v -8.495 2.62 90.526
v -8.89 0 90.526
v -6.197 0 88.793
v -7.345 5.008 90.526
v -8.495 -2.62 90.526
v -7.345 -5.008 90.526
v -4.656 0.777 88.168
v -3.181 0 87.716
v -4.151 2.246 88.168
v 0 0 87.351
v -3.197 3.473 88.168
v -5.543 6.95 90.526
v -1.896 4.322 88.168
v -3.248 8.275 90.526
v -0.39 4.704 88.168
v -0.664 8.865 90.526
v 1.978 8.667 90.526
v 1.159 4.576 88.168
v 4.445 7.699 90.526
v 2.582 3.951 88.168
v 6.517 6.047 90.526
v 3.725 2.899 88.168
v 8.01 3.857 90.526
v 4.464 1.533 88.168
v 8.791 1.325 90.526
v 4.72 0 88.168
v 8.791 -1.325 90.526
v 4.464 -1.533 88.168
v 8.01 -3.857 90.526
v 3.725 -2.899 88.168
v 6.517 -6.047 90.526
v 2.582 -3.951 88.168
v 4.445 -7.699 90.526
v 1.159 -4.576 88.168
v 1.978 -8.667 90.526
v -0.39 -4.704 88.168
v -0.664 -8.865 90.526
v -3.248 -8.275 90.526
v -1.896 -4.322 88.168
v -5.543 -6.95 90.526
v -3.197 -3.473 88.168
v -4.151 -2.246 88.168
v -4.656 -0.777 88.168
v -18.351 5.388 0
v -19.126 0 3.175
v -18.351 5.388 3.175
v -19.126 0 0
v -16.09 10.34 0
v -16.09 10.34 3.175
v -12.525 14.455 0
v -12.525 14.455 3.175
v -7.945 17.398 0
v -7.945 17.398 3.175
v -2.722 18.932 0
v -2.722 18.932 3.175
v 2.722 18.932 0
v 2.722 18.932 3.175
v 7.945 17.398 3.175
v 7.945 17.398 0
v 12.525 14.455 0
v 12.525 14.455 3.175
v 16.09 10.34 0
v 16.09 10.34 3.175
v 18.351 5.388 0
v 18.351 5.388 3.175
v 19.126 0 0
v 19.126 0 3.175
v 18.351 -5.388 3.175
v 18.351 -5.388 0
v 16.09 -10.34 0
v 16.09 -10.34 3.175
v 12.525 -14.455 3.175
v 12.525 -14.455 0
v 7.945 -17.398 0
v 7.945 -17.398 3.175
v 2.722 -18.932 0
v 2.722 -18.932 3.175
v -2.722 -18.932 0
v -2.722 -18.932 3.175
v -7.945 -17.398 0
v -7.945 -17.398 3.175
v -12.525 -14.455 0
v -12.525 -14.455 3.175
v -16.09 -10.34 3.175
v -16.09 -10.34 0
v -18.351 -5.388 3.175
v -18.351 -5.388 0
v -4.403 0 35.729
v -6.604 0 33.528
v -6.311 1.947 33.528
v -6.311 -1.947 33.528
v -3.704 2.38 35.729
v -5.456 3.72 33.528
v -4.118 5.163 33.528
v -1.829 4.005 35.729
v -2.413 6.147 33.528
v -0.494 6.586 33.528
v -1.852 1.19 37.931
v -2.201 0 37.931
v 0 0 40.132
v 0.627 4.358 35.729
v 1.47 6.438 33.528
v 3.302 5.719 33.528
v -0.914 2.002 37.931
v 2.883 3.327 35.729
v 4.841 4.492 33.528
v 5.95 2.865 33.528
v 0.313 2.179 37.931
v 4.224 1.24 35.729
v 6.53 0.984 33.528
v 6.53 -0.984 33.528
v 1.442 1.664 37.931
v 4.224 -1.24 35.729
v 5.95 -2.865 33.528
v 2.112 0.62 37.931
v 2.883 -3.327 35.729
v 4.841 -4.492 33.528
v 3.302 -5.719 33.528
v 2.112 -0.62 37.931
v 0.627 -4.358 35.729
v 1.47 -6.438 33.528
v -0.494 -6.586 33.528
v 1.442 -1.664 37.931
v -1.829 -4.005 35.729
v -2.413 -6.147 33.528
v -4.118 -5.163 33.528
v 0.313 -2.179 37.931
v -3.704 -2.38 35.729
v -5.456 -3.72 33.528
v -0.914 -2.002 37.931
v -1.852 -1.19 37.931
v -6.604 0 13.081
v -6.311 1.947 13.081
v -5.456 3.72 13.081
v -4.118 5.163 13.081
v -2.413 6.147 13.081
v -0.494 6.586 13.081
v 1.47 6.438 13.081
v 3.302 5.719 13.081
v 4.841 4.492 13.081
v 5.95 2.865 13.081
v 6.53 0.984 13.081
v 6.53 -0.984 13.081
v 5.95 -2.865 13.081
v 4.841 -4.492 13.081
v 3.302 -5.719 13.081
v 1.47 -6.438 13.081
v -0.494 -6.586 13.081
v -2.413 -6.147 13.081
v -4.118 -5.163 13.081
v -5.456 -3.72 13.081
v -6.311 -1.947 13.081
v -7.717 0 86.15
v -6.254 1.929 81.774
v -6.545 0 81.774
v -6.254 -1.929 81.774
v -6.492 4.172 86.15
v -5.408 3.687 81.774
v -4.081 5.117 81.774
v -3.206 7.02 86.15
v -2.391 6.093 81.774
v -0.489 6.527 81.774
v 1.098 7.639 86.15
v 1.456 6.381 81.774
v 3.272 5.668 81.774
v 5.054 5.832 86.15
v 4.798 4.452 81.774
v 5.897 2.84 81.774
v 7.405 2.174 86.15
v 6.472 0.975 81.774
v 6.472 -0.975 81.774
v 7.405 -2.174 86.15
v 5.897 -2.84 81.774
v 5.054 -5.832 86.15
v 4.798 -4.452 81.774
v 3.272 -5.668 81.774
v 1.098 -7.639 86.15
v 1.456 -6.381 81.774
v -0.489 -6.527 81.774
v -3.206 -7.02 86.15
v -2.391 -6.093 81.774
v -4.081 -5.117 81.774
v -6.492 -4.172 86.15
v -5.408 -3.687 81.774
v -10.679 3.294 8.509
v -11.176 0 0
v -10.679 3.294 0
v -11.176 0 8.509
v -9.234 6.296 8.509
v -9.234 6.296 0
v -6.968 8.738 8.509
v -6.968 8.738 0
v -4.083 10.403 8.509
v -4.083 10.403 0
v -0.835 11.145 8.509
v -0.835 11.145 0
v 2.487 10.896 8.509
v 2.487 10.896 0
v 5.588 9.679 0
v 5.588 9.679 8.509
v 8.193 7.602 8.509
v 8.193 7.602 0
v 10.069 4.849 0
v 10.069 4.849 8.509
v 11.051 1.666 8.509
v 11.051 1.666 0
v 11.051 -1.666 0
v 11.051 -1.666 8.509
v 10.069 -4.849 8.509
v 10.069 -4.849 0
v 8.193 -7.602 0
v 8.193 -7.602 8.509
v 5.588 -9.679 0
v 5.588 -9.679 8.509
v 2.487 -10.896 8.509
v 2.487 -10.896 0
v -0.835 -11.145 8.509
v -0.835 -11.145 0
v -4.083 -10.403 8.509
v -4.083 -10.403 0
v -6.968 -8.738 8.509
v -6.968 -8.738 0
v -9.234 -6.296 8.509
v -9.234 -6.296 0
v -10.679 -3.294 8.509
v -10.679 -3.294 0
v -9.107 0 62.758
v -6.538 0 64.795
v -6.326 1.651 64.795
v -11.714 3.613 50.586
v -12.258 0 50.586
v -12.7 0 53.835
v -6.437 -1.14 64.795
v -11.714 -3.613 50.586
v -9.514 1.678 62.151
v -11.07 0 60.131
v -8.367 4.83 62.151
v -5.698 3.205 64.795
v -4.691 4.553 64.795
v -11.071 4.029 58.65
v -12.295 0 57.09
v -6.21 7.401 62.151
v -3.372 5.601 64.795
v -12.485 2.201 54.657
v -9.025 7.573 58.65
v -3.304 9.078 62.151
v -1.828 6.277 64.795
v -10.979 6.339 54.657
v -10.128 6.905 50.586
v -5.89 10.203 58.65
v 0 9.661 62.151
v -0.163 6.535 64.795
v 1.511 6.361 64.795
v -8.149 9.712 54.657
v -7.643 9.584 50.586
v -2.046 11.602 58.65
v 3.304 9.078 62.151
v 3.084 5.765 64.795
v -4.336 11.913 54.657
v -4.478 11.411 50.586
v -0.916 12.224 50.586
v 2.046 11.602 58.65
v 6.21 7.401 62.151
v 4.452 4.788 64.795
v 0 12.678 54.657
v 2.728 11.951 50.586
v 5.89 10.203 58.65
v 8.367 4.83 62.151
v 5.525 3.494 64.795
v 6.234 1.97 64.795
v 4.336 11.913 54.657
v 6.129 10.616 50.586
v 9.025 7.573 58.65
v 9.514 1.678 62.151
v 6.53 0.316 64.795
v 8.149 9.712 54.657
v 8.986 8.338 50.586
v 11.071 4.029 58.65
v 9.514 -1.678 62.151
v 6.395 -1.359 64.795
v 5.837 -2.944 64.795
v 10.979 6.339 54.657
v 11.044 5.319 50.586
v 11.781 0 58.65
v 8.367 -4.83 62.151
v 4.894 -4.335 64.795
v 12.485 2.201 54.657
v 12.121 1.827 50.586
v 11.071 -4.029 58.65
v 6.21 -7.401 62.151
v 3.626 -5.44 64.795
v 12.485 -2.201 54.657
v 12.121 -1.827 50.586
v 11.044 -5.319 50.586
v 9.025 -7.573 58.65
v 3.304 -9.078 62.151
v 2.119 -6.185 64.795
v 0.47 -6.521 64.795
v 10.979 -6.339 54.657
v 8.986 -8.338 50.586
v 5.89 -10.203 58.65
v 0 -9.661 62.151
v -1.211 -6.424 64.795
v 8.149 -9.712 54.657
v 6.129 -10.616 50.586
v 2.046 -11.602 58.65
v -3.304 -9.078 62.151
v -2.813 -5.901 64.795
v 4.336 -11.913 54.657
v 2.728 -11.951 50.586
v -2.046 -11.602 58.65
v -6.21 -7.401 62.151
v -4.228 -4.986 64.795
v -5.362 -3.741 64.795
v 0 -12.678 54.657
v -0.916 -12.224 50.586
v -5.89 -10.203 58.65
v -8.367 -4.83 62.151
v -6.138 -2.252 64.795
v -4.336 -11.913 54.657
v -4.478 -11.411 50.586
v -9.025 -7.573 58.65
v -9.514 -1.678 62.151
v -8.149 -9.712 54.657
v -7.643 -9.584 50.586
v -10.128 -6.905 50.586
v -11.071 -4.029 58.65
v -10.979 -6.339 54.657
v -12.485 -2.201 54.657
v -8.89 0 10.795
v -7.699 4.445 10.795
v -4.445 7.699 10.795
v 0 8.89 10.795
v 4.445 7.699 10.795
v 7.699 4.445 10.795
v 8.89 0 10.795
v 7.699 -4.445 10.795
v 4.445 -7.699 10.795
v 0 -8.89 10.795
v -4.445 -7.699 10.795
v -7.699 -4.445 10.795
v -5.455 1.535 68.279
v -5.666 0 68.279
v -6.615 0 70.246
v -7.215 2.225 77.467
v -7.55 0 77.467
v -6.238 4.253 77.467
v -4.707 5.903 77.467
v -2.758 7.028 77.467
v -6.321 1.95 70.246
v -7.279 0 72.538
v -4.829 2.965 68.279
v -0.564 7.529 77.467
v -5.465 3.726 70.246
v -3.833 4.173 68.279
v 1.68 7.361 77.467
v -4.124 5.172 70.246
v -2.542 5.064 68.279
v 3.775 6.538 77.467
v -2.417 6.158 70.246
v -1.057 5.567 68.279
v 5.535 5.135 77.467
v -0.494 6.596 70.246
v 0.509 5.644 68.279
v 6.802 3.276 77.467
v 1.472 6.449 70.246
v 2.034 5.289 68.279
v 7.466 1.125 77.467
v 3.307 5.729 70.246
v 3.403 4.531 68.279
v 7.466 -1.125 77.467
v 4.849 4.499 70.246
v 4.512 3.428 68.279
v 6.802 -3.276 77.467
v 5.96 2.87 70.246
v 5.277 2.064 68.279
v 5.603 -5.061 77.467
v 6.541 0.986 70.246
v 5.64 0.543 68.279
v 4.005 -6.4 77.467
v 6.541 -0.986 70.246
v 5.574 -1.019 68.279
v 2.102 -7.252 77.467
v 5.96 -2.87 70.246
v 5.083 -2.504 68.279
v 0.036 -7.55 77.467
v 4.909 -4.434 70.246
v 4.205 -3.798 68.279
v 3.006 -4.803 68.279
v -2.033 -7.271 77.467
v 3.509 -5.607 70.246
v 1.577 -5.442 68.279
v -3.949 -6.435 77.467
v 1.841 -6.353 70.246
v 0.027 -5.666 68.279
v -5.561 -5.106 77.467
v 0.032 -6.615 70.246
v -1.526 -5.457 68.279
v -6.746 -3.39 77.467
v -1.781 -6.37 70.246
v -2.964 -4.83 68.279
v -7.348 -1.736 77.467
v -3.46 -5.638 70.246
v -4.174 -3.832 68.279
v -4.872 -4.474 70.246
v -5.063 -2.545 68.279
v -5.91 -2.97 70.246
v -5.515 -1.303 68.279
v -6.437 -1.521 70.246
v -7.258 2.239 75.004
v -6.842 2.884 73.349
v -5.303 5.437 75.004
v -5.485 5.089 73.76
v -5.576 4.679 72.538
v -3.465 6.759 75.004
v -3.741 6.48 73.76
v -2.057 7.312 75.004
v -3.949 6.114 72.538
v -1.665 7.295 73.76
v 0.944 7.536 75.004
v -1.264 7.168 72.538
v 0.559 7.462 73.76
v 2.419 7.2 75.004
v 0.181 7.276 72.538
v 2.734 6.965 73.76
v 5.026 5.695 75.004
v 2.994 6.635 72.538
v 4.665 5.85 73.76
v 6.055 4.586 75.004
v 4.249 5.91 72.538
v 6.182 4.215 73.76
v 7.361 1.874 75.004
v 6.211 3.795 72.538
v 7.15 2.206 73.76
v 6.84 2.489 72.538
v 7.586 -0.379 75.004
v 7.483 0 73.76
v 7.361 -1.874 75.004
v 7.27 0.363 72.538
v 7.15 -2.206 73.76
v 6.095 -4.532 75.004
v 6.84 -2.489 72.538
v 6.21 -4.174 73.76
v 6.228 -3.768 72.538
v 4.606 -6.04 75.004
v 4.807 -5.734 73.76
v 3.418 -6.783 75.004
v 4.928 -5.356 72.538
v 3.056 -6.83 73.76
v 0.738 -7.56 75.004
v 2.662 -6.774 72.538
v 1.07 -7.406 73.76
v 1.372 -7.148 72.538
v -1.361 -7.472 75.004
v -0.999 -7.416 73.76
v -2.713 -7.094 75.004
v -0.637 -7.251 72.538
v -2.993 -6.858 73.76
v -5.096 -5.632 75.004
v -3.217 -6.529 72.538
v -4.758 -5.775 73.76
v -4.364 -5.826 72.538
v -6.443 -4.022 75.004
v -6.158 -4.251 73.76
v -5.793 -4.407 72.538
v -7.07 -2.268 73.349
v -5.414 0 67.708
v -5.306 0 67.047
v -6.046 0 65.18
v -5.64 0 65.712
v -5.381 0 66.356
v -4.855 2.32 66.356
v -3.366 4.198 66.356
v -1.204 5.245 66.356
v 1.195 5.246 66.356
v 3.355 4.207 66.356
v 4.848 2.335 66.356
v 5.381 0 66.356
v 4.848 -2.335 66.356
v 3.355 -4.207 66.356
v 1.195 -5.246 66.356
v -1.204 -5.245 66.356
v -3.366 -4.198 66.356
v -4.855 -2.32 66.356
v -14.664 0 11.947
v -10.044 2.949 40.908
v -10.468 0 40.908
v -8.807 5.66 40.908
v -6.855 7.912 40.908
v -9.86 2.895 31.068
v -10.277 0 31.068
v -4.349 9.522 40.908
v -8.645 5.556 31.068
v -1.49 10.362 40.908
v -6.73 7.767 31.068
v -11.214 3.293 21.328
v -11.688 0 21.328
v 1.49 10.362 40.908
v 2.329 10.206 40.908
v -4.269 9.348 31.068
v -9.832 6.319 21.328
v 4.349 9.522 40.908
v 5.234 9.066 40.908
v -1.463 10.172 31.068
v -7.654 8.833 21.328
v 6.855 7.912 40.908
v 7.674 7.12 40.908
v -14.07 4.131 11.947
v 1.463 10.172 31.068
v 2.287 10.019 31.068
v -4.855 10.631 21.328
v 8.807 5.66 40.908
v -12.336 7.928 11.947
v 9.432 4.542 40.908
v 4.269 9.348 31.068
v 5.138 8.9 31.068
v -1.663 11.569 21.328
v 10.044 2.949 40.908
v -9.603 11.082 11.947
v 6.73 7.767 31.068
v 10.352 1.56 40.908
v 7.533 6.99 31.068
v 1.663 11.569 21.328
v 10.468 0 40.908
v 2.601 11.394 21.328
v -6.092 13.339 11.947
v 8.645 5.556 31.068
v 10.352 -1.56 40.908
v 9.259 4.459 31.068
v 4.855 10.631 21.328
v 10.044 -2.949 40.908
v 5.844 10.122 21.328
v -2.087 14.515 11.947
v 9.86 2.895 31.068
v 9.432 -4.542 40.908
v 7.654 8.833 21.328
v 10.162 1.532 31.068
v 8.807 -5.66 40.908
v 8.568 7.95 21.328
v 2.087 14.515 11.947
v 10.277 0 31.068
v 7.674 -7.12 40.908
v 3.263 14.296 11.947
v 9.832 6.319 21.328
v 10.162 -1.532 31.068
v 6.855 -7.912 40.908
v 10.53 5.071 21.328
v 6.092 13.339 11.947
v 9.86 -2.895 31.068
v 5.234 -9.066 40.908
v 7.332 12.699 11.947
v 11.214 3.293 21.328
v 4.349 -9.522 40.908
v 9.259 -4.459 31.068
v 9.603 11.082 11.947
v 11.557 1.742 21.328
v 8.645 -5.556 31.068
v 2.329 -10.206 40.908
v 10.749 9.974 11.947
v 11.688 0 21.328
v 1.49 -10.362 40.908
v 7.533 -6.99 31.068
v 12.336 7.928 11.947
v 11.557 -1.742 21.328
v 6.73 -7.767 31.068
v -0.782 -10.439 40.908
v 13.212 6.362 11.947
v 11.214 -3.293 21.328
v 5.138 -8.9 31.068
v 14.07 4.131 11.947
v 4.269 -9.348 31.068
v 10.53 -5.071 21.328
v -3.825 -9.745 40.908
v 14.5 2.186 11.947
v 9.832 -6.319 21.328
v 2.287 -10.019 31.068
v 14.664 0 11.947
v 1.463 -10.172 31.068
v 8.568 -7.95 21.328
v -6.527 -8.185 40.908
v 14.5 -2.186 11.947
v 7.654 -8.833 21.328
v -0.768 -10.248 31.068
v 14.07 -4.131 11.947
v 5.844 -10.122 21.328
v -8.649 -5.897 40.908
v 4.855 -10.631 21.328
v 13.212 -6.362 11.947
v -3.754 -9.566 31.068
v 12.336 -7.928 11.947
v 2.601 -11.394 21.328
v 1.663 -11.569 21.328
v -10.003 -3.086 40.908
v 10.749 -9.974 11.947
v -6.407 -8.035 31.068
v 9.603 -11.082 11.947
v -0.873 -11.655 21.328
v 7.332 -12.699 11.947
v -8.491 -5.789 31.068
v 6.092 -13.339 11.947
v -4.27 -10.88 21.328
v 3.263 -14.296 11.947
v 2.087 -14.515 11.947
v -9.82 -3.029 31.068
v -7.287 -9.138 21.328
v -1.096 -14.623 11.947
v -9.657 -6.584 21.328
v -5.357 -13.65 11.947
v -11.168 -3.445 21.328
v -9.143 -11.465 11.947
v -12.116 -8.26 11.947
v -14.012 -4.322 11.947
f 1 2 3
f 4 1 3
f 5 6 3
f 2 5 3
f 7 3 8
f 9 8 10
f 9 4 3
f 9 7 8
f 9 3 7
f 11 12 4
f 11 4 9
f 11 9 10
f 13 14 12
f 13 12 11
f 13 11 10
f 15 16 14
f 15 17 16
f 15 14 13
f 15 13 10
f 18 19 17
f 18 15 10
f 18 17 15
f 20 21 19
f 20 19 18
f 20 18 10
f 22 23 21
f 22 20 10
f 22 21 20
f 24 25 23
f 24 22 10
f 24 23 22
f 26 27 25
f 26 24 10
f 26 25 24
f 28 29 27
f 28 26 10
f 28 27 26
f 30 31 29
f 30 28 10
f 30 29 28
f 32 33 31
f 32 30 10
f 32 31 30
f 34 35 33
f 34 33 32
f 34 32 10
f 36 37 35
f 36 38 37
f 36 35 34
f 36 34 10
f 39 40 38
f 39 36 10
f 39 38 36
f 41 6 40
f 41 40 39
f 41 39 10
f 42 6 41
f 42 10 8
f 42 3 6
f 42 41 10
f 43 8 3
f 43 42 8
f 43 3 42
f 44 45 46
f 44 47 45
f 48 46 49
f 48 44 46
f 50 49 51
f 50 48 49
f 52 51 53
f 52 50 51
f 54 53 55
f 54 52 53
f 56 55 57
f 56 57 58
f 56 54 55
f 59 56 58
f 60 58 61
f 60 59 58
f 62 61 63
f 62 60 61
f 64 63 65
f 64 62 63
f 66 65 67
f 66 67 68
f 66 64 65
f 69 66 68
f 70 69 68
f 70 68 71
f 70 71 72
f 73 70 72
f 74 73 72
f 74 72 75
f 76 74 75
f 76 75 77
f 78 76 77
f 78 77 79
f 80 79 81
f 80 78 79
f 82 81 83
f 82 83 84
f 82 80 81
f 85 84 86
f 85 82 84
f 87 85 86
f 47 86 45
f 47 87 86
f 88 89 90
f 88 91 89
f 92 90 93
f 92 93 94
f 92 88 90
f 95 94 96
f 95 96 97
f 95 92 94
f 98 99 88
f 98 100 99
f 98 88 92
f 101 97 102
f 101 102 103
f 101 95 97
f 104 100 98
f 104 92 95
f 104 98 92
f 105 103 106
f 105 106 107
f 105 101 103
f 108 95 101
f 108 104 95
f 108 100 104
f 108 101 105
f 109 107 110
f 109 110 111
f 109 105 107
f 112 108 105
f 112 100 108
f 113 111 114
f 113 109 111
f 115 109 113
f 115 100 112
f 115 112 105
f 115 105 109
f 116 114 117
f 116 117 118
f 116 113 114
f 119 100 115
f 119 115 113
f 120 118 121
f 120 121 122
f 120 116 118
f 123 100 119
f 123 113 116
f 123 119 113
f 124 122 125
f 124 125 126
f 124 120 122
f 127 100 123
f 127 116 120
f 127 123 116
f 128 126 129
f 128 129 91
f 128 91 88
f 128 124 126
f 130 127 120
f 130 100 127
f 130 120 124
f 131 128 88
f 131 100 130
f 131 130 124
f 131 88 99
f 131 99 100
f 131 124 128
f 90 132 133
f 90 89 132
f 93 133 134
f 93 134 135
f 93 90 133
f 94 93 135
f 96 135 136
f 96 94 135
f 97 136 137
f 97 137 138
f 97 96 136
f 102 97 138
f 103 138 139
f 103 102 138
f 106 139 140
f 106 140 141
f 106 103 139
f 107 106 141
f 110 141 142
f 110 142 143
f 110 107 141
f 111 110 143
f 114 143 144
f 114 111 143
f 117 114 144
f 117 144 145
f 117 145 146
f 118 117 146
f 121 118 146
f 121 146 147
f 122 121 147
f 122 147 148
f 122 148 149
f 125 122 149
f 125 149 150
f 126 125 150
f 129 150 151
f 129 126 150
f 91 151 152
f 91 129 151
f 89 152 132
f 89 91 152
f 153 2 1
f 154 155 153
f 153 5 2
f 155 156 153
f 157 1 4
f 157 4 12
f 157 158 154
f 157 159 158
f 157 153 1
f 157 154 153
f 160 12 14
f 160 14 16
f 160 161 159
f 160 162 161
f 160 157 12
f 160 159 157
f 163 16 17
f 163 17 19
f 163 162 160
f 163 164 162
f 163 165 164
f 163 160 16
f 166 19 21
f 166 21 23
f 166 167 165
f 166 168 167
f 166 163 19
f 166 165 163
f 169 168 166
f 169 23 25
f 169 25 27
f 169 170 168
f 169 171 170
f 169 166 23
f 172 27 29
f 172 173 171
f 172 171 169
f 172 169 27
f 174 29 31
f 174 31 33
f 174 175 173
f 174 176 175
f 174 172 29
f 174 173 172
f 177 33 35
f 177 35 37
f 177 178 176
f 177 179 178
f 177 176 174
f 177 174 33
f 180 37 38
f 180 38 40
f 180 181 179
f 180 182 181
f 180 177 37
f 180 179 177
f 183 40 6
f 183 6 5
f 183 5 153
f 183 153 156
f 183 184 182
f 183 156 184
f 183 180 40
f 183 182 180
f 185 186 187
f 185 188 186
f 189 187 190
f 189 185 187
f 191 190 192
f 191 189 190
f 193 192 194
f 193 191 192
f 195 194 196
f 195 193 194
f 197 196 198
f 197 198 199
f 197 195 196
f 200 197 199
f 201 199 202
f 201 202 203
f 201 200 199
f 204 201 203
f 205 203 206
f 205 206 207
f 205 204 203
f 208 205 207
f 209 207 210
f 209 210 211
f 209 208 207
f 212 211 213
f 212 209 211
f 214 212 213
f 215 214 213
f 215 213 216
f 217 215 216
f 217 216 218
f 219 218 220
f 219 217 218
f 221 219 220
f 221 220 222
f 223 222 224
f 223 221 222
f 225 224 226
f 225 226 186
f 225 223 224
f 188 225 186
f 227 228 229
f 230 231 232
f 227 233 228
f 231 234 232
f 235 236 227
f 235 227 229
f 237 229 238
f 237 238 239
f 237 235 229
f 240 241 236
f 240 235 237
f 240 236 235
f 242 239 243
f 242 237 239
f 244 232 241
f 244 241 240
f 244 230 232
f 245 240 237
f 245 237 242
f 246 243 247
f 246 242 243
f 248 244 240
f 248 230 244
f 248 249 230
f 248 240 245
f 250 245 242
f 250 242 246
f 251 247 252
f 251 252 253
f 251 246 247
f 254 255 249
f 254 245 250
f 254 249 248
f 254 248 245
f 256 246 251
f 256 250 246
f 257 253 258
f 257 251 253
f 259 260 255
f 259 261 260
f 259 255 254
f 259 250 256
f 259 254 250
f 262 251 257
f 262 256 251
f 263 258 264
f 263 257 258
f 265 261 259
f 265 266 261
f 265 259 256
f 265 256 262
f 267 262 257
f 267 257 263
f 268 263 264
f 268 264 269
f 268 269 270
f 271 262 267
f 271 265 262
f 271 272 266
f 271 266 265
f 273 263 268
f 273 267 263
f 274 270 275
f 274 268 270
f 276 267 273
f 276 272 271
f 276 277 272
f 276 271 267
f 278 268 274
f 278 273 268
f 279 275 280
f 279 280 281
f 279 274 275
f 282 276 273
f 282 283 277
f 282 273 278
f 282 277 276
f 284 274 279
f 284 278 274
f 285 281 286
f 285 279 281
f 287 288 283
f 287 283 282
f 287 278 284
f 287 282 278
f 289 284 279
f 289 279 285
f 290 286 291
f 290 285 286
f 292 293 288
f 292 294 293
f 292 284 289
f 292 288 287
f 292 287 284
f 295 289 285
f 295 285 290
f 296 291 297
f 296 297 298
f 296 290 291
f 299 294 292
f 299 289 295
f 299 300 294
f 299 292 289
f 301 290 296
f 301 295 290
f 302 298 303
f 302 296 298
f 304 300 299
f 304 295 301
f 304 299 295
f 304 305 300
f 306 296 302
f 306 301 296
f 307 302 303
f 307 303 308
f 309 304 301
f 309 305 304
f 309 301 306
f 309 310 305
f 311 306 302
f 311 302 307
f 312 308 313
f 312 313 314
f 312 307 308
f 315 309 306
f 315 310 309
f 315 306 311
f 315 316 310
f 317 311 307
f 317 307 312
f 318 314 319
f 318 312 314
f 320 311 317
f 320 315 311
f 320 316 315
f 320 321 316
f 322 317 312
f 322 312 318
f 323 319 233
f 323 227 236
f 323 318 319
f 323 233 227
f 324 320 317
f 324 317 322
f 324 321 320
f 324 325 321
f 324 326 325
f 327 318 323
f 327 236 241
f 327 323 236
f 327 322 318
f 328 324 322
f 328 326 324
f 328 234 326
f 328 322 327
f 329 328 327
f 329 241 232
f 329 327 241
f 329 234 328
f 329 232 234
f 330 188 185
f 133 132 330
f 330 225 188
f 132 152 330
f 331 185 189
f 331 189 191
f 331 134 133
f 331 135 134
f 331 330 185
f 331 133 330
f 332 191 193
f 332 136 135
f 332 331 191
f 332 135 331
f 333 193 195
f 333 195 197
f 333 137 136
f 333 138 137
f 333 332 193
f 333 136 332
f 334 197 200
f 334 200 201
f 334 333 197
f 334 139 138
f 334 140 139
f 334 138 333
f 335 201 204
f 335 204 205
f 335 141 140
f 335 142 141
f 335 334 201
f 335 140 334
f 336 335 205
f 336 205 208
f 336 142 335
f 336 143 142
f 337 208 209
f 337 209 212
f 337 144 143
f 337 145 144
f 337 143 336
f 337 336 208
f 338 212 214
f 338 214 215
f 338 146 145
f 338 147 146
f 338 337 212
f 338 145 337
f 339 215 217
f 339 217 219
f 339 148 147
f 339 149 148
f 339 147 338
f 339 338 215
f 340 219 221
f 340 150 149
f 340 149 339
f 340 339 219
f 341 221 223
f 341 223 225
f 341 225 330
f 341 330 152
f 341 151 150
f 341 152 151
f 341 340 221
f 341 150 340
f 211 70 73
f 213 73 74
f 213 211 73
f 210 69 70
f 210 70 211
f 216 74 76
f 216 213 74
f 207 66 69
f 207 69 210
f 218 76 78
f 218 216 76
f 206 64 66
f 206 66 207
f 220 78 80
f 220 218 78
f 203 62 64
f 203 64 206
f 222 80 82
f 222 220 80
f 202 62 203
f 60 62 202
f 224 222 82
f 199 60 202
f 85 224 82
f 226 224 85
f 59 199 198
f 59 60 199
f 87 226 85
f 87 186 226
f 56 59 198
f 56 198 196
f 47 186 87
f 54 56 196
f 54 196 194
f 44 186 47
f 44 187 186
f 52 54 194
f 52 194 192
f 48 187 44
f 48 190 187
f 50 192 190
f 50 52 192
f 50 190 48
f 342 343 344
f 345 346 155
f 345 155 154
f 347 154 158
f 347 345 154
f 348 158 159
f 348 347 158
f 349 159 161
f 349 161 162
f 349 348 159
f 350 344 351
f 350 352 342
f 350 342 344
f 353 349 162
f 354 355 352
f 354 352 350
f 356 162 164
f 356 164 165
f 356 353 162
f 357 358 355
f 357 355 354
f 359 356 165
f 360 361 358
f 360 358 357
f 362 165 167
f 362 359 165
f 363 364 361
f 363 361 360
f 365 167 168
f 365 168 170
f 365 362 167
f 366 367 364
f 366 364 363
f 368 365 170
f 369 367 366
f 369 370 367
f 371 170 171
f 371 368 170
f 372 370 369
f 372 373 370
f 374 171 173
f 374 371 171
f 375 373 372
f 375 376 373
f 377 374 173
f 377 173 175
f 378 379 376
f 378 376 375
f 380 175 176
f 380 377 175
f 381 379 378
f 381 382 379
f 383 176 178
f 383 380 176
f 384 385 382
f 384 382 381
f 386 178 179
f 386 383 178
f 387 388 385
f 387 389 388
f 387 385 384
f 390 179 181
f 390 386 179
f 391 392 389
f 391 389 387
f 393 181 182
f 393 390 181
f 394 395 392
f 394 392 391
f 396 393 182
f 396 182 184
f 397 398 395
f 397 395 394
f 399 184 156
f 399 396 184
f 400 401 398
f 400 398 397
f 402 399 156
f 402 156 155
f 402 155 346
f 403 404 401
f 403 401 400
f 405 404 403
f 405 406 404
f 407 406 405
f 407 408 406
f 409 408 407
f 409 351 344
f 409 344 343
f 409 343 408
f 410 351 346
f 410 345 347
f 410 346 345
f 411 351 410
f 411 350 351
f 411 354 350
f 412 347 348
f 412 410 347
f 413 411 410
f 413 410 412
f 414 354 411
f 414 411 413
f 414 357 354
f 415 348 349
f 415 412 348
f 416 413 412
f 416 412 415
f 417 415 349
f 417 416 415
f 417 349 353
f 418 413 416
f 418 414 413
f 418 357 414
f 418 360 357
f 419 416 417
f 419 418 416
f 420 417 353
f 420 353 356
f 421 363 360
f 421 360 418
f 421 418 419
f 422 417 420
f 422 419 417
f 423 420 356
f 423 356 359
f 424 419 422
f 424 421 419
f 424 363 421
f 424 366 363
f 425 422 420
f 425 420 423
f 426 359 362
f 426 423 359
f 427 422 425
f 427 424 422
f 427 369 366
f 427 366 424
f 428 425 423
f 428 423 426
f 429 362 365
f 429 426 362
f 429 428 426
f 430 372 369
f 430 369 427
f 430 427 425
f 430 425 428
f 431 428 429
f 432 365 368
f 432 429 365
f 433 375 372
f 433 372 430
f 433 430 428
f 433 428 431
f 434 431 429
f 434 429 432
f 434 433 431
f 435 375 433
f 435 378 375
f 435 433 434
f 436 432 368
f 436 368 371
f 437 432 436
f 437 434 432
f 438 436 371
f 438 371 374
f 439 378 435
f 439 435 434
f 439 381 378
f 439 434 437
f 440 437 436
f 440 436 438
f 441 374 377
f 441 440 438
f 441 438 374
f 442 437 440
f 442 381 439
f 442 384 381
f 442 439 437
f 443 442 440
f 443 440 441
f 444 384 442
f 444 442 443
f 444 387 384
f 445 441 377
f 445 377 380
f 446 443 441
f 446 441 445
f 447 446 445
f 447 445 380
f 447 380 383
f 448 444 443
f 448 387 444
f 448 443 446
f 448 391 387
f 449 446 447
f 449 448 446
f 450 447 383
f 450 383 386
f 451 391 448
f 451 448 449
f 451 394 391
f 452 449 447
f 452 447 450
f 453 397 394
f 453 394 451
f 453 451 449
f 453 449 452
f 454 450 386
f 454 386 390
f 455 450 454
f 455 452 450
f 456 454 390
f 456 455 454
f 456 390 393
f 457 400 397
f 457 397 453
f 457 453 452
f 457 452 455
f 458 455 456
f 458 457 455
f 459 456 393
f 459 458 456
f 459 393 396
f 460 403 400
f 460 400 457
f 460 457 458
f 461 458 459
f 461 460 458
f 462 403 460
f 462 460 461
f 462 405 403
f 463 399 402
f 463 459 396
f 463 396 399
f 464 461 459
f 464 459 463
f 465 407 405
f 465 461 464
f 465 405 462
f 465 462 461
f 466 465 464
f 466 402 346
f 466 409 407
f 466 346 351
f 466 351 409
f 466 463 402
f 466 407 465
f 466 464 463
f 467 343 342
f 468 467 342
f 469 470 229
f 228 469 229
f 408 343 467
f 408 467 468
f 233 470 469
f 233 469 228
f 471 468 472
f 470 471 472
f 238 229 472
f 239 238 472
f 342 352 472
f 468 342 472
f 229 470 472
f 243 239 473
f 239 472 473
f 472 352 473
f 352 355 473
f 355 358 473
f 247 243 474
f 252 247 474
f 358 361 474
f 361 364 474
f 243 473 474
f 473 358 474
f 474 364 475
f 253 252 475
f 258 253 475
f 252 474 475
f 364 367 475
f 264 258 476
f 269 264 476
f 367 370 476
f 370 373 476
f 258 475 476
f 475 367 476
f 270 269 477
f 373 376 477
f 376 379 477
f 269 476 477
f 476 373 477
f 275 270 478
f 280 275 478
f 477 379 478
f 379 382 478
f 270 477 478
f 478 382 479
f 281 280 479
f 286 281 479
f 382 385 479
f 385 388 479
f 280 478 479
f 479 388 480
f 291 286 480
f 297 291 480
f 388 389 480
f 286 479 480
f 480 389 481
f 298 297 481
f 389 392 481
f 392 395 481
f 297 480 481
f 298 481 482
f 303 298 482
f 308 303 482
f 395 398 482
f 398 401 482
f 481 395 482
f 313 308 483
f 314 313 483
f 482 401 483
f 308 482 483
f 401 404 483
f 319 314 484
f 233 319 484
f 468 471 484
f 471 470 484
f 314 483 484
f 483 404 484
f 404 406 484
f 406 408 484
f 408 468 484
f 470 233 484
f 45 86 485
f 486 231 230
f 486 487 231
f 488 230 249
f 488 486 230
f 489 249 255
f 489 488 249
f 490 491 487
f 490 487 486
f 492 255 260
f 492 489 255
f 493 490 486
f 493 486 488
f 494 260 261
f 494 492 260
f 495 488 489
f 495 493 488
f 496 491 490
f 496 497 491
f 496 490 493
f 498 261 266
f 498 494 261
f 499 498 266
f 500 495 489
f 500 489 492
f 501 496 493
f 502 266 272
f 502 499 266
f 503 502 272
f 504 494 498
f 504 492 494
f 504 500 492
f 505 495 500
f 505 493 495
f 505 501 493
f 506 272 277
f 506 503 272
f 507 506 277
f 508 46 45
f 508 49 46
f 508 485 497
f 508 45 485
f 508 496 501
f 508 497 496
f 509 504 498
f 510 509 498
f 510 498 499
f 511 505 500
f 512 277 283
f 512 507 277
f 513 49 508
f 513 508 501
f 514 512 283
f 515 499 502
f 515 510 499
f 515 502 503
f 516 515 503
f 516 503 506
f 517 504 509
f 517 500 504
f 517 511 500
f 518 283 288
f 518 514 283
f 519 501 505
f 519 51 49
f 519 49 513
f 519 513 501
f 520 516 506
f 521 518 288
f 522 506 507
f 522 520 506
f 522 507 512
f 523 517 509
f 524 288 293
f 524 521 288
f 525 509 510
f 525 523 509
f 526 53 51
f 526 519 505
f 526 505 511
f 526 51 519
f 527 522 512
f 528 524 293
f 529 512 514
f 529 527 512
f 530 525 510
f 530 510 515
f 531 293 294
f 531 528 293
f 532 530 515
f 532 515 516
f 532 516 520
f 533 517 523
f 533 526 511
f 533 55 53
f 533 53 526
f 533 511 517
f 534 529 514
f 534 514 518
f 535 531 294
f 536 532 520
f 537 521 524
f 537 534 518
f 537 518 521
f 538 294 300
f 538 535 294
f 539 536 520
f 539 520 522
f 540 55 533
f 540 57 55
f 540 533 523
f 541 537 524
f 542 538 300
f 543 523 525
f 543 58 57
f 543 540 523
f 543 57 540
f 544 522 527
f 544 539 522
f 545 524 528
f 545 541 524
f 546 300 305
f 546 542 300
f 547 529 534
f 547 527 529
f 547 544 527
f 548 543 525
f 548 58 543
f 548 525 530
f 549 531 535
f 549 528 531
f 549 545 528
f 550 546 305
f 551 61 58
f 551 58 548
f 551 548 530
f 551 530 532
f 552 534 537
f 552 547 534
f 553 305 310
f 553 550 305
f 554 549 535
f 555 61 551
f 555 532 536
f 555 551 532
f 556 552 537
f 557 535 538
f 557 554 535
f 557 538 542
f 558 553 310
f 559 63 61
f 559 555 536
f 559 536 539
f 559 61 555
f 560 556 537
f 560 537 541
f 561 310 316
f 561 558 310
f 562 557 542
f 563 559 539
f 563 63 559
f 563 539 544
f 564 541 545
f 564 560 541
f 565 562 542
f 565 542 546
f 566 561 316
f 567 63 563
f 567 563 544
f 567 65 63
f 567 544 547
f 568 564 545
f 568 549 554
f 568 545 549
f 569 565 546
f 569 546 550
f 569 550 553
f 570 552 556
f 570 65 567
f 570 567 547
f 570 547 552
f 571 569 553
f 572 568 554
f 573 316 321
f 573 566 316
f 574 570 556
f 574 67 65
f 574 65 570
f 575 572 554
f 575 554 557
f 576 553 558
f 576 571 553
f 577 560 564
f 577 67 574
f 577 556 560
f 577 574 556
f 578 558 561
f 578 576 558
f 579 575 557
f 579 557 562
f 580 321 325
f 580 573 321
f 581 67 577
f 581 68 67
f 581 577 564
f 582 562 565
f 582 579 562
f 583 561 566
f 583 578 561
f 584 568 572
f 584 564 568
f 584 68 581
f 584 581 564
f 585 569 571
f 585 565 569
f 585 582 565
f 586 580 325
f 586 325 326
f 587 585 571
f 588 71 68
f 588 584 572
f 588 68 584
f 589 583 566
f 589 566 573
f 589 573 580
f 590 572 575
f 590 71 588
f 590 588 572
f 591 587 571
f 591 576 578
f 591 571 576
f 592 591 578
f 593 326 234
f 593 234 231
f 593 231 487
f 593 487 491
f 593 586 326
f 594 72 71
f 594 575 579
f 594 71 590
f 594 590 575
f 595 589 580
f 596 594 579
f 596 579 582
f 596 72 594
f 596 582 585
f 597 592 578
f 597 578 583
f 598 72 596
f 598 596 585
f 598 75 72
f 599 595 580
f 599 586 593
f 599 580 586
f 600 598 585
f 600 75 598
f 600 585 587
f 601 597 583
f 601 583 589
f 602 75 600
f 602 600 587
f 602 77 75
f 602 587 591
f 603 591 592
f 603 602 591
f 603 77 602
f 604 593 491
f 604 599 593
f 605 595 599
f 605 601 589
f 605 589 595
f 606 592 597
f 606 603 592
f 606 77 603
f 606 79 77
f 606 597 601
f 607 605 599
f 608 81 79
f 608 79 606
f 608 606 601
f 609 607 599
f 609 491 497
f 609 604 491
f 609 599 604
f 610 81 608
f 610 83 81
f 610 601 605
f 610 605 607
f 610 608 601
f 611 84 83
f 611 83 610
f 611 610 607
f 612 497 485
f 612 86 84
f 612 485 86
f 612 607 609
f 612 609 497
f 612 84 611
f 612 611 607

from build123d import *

# Parameters (mm, degrees)
F2_R = 2.54


with BuildPart() as f1:
    # F0 (on Front) → F1 (revolve)
    with BuildSketch(Plane.XZ):
        with BuildLine():
            Line((0, 40.132), (0, 87.3506))
            ThreePointArc((0, 87.3506), (-4.7199768273, 88.1681648836), (-8.89, 90.5256))
            Line((-8.89, 90.5256), (-6.5449999258, 81.7739405792))
            add(Edge.make_bspline(
                [(-6.5449999258, 81.7739405792), (-10.5023747002, 71.8176961368), (-3.81, 66.0219296347)],
                knots=[1.0331645714, 1.0331645714, 1.0331645714, 2.617993878, 2.617993878, 2.617993878], degree=2, weights=[1, 0.7021280086, 1]))
            ThreePointArc((-3.81, 66.0219296347), (-11.1405483174, 60.0042932836), (-12.2581887711, 50.5862379799))
            ThreePointArc((-12.2581887711, 50.5862379799), (-10.7830325107, 26.1694758028), (-19.1262, 3.175))
            Line((-19.1262, 3.175), (-19.1262, 0))
            Line((-19.1262, 0), (-11.176, 0))
            Line((-11.176, 0), (-11.176, 8.509))
            Line((-11.176, 8.509), (-6.604, 13.081))
            Line((-6.604, 13.081), (-6.604, 33.528))
            Line((-6.604, 33.528), (0, 40.132))
        make_face()
    revolve(axis=Axis((0, 0, 63.7413), (0, 0, -1)))

    # F2
    f2_edges = [f1.edges().sort_by_distance(p)[0] for p in [
        (3.81, 0, 66.02193),
    ]]
    fillet(f2_edges, radius=F2_R)


solid = f1.part
